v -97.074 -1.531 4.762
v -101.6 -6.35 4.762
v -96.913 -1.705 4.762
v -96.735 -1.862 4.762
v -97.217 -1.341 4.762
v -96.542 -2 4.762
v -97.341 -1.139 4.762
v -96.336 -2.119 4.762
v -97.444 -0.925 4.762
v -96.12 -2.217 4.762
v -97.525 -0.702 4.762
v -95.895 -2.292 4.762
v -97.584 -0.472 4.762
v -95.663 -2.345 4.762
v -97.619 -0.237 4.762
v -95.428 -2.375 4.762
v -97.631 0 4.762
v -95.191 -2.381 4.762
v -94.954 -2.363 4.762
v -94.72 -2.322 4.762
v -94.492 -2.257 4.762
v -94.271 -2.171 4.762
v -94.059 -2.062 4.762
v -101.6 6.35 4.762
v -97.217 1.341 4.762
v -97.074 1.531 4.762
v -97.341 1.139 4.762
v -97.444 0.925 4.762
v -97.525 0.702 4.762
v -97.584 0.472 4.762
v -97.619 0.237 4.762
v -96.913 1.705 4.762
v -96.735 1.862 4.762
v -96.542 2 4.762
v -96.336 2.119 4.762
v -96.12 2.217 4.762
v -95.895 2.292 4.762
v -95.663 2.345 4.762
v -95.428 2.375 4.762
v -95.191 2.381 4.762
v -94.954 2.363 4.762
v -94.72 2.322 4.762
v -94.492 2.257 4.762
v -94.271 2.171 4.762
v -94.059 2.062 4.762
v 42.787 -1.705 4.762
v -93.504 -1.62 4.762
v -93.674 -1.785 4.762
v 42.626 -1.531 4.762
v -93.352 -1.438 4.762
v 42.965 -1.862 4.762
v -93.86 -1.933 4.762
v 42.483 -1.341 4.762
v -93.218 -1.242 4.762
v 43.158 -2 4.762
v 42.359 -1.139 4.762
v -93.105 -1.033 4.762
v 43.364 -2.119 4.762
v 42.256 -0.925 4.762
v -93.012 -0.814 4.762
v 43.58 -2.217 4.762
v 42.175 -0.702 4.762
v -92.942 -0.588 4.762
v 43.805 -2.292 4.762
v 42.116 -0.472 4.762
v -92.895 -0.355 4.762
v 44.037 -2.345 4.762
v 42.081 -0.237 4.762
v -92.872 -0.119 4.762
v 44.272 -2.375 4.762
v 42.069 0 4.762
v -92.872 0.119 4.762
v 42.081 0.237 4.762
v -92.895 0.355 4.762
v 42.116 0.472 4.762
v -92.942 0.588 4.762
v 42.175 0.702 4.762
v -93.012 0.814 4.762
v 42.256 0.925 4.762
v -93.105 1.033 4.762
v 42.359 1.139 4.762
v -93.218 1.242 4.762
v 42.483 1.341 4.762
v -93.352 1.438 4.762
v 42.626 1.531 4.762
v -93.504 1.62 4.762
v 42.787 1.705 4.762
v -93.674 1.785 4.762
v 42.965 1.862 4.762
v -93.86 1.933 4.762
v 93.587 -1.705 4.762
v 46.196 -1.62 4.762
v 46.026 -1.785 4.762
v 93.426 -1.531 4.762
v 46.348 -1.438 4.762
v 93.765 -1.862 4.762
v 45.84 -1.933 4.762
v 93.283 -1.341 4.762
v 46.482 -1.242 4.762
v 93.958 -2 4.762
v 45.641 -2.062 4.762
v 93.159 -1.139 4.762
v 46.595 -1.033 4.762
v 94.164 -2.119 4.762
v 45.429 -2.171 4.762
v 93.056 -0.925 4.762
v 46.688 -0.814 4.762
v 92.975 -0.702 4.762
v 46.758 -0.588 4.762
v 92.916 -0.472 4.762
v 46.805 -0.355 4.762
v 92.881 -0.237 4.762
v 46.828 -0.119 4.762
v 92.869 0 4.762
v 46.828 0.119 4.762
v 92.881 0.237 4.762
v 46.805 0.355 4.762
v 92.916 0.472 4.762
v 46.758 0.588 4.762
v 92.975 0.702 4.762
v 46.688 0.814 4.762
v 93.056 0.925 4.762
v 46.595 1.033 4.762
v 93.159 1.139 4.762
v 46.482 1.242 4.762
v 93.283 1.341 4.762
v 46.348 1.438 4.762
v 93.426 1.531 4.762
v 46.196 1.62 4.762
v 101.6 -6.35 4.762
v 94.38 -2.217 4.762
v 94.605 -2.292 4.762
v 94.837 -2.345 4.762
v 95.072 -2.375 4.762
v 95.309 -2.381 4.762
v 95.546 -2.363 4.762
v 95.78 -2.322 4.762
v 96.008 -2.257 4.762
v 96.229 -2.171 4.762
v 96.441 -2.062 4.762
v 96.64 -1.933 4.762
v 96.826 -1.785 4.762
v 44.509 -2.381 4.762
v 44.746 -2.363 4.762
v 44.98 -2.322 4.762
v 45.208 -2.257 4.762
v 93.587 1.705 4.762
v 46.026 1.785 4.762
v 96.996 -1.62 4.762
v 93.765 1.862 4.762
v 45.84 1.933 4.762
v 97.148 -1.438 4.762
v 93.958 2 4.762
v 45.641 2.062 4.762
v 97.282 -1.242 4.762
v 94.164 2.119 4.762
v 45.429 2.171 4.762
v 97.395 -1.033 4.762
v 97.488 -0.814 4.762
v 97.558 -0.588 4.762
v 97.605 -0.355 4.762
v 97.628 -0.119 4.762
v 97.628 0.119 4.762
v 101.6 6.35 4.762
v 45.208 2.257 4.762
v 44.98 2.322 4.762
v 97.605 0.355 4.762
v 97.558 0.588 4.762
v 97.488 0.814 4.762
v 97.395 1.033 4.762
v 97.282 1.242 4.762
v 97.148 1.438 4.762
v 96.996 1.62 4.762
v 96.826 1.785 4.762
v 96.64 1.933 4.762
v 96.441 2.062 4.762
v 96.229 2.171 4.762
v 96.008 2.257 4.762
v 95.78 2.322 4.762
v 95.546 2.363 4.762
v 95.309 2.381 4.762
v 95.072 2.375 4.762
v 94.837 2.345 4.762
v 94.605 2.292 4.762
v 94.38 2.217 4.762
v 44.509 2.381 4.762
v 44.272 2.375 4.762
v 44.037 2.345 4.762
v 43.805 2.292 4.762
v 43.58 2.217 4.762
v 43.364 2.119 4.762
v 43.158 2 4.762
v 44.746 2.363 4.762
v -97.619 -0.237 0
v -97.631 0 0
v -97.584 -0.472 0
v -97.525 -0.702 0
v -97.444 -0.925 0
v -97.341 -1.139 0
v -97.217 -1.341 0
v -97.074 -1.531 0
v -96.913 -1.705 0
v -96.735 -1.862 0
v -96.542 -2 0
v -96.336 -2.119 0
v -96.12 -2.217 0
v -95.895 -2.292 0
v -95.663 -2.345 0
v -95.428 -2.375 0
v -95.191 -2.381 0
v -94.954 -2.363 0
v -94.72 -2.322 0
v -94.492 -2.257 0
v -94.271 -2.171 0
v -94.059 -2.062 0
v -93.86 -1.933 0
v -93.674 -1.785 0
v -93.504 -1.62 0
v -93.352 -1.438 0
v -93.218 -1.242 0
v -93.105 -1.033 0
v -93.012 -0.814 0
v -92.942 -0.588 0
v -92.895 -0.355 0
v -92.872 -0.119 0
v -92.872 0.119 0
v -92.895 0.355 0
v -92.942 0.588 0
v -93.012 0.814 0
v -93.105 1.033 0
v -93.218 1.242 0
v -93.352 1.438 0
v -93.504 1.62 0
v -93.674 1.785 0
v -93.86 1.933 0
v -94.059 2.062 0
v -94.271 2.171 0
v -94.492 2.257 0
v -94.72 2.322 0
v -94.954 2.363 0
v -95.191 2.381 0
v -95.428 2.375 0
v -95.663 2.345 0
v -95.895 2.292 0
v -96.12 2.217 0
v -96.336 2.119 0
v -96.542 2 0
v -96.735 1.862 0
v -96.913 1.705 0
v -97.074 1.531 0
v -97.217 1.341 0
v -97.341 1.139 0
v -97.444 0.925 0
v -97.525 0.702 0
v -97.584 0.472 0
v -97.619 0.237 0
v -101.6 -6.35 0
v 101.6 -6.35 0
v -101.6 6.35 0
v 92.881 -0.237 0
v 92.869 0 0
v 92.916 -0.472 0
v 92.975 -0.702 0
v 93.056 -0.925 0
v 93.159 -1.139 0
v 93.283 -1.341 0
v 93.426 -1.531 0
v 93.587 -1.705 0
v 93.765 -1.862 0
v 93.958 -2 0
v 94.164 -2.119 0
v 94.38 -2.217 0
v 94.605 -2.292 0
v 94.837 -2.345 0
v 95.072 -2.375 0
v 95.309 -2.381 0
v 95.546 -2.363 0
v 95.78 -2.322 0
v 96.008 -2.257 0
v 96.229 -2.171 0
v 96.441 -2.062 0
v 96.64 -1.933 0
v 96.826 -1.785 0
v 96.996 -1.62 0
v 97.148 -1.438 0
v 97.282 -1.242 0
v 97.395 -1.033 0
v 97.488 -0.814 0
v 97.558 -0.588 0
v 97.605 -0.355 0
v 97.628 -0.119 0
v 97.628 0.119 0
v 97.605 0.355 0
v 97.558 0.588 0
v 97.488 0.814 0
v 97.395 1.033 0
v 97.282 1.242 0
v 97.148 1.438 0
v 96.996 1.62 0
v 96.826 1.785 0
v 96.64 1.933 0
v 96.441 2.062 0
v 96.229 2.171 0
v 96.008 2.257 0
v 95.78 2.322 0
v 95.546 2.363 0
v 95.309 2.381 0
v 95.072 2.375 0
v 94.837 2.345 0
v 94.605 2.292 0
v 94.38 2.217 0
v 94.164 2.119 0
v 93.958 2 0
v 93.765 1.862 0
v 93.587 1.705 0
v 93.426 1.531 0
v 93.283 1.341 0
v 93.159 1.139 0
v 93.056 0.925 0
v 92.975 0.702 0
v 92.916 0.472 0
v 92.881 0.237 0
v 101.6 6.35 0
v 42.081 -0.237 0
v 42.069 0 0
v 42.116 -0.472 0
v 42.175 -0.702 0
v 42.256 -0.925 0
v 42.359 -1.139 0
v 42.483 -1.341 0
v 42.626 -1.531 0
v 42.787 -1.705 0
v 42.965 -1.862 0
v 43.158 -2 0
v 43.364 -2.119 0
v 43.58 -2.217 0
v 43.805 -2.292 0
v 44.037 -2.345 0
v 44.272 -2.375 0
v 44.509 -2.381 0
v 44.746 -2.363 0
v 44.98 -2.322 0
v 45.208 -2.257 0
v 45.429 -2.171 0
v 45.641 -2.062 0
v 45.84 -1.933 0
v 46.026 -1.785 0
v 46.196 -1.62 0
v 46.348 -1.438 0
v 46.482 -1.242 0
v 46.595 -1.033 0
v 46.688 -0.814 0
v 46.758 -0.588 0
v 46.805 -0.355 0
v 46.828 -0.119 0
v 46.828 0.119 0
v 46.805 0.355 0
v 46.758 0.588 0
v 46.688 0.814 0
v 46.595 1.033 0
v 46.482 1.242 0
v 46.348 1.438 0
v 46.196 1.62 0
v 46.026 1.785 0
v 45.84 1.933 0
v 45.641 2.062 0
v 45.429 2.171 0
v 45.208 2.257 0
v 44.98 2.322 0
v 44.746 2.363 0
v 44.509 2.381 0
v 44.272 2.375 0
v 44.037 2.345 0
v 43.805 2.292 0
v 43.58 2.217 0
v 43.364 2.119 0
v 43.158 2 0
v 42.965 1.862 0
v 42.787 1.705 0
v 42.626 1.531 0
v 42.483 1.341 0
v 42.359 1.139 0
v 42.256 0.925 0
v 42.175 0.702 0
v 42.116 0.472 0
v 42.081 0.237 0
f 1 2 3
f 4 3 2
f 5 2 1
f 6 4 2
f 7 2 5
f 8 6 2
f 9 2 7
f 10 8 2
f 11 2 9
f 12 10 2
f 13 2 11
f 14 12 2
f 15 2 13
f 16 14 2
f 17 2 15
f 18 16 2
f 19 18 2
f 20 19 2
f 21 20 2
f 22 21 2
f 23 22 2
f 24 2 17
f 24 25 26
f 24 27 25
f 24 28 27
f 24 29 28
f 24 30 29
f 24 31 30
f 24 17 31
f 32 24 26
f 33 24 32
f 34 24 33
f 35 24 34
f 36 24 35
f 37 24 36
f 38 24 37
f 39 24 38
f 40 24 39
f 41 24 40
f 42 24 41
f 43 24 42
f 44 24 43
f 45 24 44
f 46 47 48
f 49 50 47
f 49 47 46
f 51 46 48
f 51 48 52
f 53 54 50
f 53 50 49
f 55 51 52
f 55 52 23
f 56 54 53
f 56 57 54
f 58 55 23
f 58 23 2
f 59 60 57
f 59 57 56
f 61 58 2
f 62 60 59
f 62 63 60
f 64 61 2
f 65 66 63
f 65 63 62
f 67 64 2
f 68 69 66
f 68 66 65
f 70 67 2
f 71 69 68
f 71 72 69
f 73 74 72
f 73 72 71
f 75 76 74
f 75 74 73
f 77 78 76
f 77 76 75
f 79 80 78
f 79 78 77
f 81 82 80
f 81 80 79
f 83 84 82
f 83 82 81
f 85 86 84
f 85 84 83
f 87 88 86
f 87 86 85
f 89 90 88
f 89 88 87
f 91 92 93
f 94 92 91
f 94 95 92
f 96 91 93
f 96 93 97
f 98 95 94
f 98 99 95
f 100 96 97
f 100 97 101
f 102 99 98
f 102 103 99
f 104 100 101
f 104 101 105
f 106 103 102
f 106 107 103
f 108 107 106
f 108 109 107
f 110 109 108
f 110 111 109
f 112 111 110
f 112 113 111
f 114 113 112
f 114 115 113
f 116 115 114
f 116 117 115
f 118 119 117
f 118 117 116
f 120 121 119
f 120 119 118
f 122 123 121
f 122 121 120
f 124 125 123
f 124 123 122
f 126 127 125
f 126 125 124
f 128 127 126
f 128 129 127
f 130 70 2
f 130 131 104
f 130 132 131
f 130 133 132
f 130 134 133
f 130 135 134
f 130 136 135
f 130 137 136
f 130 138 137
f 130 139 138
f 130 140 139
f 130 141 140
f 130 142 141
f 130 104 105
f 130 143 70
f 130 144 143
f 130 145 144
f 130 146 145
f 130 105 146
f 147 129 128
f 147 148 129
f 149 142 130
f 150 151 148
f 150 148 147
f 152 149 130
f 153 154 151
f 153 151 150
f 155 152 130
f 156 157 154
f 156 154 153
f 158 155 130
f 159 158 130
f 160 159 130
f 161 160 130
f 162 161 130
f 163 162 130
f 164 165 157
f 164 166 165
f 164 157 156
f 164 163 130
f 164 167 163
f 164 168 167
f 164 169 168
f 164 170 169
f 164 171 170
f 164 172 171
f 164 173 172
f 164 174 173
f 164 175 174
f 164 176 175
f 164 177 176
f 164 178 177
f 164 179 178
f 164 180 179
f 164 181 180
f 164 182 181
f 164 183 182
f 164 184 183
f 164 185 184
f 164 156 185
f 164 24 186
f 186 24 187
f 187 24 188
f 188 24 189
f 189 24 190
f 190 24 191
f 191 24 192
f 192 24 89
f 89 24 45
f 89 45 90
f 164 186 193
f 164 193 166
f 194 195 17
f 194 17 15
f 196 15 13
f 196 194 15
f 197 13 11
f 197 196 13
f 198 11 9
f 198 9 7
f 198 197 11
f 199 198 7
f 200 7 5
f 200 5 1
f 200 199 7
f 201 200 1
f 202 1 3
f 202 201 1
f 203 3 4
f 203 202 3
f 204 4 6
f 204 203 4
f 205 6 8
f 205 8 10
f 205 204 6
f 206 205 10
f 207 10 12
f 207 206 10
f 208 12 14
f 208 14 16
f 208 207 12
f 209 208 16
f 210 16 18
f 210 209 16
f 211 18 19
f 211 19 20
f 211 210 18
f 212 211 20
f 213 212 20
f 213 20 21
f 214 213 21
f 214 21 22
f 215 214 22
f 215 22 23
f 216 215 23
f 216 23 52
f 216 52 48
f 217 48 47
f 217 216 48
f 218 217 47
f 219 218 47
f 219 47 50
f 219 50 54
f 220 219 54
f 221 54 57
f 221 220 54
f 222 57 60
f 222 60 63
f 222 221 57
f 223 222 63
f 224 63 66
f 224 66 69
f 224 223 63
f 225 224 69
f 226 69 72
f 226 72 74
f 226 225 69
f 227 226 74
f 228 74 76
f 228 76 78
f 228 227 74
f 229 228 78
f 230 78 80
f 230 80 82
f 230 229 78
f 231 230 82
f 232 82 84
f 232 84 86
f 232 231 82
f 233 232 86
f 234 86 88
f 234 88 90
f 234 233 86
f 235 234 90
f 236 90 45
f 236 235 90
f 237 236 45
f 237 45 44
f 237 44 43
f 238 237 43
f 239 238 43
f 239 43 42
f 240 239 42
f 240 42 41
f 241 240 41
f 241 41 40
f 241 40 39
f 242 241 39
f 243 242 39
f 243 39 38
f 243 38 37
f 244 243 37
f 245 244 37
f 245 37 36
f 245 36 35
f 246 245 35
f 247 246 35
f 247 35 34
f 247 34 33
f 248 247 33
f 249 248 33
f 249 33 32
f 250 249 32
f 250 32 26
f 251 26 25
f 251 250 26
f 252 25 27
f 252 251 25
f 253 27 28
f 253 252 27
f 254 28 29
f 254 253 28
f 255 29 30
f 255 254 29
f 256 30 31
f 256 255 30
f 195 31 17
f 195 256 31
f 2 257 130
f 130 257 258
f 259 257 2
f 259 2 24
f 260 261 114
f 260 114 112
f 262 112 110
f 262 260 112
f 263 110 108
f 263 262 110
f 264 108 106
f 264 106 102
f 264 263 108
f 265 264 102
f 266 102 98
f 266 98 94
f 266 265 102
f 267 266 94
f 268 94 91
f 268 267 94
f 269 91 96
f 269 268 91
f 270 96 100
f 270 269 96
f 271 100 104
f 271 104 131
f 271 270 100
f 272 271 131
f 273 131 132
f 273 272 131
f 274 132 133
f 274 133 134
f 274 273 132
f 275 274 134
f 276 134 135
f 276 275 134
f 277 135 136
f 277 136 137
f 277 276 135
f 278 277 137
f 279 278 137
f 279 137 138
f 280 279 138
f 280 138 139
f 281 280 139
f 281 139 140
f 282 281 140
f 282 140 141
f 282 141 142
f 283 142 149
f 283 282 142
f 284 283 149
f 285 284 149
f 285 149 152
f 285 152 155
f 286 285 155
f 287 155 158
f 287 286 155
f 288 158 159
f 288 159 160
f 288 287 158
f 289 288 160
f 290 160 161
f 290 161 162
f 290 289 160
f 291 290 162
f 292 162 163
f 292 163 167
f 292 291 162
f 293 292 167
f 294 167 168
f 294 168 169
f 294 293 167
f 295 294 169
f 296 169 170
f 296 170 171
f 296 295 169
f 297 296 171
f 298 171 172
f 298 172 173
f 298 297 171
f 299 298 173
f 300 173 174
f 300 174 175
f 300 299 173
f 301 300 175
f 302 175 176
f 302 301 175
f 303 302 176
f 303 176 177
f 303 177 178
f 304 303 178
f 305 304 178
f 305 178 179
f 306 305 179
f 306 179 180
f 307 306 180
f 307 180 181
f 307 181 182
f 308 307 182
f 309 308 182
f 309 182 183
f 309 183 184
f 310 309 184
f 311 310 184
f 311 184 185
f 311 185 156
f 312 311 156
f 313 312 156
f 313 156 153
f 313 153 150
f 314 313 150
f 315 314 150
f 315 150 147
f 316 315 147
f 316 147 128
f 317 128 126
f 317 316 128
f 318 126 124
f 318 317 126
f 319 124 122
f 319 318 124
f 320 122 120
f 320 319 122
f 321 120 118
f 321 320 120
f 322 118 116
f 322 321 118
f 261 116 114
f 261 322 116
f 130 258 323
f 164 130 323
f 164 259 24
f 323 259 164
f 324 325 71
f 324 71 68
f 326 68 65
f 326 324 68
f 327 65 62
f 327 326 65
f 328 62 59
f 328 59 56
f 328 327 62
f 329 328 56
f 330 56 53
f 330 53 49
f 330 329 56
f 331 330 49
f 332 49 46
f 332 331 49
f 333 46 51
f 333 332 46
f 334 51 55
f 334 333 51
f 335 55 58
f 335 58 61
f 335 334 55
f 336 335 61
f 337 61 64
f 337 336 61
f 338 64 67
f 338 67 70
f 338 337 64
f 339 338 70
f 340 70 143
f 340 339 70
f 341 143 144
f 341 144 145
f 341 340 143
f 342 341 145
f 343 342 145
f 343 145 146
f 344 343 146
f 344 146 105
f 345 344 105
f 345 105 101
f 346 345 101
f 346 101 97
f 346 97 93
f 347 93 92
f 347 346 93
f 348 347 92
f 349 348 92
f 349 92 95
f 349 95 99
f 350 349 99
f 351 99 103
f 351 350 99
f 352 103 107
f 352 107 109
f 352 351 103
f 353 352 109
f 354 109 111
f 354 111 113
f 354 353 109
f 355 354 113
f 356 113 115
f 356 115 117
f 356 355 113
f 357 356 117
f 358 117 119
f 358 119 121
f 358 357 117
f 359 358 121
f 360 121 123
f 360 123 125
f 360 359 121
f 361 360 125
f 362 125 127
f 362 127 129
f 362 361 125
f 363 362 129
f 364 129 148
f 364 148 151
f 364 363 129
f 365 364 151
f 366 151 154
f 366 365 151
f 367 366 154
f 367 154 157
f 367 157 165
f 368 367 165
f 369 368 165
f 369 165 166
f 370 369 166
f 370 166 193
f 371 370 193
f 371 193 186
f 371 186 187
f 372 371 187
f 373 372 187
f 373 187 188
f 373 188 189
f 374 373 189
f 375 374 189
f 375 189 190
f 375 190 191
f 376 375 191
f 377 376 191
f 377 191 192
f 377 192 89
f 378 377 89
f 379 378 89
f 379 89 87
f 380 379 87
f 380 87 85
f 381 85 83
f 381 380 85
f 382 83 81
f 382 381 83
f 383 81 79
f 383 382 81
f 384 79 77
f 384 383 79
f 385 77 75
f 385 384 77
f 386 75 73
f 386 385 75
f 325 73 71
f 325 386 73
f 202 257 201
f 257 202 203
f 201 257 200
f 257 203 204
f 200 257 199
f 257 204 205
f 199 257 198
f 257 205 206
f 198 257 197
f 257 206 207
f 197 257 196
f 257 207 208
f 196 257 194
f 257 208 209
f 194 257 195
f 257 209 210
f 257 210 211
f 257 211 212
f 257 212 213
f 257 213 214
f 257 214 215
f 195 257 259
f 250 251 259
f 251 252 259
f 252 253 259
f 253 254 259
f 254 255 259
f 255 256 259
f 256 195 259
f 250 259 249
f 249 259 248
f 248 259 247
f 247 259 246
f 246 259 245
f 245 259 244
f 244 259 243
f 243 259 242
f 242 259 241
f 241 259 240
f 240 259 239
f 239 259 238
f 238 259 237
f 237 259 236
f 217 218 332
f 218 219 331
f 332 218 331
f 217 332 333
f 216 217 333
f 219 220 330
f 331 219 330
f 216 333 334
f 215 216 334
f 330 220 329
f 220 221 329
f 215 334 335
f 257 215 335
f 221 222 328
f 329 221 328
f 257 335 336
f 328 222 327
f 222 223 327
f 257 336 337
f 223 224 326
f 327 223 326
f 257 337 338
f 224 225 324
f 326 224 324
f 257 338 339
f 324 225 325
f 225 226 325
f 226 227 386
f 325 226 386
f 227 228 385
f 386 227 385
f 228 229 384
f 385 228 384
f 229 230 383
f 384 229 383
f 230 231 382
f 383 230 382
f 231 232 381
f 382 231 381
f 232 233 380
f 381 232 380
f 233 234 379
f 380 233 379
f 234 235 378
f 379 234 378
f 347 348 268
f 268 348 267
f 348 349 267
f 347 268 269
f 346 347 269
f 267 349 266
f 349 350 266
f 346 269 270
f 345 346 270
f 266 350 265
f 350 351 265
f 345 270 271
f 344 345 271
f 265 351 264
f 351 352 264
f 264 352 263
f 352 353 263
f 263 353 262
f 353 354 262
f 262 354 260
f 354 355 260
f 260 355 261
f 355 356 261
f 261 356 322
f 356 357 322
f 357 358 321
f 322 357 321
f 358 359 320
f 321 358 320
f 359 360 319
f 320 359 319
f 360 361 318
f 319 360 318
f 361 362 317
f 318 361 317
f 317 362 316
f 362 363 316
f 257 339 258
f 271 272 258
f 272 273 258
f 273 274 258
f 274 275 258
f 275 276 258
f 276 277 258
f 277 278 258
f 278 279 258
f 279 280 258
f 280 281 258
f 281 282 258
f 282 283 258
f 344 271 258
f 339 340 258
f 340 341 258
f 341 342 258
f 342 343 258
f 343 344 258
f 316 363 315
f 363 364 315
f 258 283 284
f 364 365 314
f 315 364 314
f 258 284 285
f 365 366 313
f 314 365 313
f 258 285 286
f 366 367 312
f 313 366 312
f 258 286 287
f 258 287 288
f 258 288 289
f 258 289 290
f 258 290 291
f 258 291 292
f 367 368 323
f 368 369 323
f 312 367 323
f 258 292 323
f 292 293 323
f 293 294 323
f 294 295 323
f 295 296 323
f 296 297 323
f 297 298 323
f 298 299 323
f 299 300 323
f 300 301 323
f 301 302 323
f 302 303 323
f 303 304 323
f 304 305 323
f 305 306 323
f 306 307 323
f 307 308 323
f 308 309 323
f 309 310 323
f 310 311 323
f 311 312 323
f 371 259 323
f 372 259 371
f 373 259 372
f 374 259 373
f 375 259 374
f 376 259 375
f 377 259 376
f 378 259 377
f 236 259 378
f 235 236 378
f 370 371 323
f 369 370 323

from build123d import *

# Parameters (mm, degrees)
SKETCH1_W           = 203.2
SKETCH1_H           = 12.7
SKETCH1_R           = 2.38125
BOSS_EXTRUDE1_DEPTH = 4.7625


with BuildPart() as part:
    # Sketch1 → Boss-Extrude1 (new body)
    with BuildSketch(Plane.XY):
        Rectangle(SKETCH1_W, SKETCH1_H)
        with Locations(Location((95.25, 0, 0), (0, 0, 180))):
            Circle(SKETCH1_R, mode=Mode.SUBTRACT)
        with Locations(Location((44.45, 0, 0), (0, 0, 180))):
            Circle(SKETCH1_R, mode=Mode.SUBTRACT)
        with Locations(Location((-95.25, 0, 0), (0, 0, 180))):
            Circle(SKETCH1_R, mode=Mode.SUBTRACT)
    extrude(amount=BOSS_EXTRUDE1_DEPTH)


solid = part.part
